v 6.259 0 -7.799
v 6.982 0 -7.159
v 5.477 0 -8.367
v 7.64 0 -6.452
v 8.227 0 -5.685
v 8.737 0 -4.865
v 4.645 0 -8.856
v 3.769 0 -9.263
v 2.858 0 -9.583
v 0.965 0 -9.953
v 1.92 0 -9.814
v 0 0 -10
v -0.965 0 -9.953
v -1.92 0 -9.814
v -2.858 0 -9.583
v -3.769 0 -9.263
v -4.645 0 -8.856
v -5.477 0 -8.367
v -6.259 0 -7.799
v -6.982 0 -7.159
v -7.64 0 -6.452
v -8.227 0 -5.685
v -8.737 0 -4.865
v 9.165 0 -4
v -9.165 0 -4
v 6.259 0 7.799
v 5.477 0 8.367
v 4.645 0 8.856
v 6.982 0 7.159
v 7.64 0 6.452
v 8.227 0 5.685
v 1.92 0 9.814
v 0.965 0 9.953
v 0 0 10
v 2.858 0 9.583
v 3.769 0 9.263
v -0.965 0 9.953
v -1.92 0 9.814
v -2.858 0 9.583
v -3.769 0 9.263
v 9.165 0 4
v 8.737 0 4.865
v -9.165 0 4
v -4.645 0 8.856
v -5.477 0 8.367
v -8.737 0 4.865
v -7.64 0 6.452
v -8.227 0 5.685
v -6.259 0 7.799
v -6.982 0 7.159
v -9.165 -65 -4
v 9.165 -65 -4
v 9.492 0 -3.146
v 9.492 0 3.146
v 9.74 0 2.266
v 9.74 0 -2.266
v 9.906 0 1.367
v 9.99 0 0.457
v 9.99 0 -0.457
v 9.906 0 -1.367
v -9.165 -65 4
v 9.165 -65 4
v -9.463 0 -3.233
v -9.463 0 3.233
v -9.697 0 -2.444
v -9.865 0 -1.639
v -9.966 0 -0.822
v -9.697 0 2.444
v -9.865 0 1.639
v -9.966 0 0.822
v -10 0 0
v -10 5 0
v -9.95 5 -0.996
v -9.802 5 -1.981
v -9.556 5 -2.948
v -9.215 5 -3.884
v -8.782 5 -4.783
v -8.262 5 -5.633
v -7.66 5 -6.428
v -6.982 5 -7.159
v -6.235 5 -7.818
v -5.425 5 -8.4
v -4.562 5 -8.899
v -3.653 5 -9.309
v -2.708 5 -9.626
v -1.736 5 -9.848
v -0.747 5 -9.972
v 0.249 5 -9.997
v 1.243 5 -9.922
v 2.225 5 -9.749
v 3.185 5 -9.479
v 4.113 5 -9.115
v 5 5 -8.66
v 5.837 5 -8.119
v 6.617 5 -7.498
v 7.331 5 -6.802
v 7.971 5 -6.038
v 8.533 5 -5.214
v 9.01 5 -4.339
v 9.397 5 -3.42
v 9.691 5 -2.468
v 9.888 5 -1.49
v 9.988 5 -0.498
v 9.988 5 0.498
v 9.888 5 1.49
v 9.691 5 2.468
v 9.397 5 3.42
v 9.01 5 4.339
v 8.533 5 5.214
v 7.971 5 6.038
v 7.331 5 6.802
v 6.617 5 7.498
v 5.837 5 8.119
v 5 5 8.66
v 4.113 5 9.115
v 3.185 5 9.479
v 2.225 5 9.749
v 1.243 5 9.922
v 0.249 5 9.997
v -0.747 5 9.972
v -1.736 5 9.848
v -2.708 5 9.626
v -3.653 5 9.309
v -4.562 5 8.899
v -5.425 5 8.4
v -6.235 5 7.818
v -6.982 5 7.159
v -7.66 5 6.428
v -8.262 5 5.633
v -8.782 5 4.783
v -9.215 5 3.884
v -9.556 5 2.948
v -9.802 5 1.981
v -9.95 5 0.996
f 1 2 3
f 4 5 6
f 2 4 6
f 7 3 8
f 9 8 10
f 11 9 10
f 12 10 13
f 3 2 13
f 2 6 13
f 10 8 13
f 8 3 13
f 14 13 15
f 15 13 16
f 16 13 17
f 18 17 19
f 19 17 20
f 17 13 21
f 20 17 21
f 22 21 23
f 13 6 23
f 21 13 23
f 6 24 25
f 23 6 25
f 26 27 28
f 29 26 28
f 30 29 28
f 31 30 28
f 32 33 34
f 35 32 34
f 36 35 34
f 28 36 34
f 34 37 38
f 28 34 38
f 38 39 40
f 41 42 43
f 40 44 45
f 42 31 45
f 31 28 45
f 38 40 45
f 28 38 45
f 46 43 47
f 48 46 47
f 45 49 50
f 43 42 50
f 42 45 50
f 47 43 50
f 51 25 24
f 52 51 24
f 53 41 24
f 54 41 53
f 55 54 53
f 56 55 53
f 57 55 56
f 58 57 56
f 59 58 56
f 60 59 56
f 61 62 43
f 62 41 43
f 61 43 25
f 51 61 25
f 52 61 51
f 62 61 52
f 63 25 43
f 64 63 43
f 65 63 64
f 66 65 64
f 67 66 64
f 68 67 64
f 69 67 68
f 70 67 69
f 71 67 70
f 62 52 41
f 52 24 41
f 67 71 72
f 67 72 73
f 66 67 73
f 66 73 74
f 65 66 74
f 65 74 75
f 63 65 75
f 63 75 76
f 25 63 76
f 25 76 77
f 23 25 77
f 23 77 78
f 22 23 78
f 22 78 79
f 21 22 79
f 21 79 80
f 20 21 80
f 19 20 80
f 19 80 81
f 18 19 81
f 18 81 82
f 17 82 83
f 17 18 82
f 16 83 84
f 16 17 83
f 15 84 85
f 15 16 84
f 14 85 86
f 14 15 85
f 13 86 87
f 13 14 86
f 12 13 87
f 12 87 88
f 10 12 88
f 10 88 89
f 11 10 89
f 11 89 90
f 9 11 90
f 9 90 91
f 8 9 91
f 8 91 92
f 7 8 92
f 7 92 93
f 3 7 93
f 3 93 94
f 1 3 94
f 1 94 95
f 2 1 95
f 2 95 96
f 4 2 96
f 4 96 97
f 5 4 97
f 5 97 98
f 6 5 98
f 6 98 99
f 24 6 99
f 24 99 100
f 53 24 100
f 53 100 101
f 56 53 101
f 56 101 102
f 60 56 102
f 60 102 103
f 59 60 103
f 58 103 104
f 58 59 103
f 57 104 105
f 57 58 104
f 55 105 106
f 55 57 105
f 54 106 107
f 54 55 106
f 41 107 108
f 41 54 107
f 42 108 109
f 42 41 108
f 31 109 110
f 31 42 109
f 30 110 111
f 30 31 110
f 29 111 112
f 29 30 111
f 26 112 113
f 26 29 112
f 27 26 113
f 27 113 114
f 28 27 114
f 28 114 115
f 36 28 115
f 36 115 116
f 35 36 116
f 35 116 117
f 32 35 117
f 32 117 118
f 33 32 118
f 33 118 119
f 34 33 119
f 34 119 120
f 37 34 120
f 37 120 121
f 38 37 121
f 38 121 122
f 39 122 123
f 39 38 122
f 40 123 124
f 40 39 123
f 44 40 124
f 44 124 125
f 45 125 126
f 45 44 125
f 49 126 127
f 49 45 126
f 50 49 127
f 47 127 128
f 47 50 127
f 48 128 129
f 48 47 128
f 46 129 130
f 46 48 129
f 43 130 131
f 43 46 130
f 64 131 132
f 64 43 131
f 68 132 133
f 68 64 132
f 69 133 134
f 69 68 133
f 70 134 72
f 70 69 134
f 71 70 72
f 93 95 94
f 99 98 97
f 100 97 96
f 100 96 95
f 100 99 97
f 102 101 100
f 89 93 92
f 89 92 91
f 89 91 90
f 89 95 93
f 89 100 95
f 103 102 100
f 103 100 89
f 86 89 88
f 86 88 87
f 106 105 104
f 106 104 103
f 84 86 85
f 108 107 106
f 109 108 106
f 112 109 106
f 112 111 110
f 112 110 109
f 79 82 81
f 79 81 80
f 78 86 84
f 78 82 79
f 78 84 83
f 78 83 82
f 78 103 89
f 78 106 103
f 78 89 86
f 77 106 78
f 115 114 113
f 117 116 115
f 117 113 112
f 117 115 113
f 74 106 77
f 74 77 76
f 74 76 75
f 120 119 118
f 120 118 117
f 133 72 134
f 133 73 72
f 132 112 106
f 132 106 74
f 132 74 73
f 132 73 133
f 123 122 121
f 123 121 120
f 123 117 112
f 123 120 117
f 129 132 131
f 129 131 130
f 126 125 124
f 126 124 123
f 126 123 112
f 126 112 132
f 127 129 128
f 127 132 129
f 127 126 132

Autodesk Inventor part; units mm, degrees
ref_plane "YZ Plane" through (0, 0, 0) normal (1, 0, 0) x (0, 1, 0)
ref_plane "XZ Plane" through (0, 0, 0) normal (0, 1, 0) x (-1, 0, 0)
ref_plane "XY Plane" through (0, 0, 0) normal (0, 0, 1) x (1, 0, 0)
sketch "Sketch1" plane through (0, 0, 0) normal (0, 1, 0) x (-1, 0, 0)
  circle A0 centre (0, 0) radius 10
  dimension "d0" = 20
extrude "Extrusion1" add sketch "Sketch1" along normal blind 5
sketch "Sketch2" plane through (0, 0, 0) normal (0, -1, 0) x (1, 0, 0)
  line L0 (9.1652, 4) -> (-9.1652, 4)
  line L1 (-9.1652, 4) -> (-9.1652, -4)
  line L2 (-9.1652, -4) -> (9.1652, -4)
  line L3 (9.1652, -4) -> (9.1652, 4)
  circle A0 centre (0, 0) radius 10 projected
  circle A1 centre (0, 0) radius 10 projected
  dimension "d3" = 8
extrude "Extrusion2" add sketch "Sketch2" along normal blind 65 contours L3 L2 L1 L0
properties part number "rack"
